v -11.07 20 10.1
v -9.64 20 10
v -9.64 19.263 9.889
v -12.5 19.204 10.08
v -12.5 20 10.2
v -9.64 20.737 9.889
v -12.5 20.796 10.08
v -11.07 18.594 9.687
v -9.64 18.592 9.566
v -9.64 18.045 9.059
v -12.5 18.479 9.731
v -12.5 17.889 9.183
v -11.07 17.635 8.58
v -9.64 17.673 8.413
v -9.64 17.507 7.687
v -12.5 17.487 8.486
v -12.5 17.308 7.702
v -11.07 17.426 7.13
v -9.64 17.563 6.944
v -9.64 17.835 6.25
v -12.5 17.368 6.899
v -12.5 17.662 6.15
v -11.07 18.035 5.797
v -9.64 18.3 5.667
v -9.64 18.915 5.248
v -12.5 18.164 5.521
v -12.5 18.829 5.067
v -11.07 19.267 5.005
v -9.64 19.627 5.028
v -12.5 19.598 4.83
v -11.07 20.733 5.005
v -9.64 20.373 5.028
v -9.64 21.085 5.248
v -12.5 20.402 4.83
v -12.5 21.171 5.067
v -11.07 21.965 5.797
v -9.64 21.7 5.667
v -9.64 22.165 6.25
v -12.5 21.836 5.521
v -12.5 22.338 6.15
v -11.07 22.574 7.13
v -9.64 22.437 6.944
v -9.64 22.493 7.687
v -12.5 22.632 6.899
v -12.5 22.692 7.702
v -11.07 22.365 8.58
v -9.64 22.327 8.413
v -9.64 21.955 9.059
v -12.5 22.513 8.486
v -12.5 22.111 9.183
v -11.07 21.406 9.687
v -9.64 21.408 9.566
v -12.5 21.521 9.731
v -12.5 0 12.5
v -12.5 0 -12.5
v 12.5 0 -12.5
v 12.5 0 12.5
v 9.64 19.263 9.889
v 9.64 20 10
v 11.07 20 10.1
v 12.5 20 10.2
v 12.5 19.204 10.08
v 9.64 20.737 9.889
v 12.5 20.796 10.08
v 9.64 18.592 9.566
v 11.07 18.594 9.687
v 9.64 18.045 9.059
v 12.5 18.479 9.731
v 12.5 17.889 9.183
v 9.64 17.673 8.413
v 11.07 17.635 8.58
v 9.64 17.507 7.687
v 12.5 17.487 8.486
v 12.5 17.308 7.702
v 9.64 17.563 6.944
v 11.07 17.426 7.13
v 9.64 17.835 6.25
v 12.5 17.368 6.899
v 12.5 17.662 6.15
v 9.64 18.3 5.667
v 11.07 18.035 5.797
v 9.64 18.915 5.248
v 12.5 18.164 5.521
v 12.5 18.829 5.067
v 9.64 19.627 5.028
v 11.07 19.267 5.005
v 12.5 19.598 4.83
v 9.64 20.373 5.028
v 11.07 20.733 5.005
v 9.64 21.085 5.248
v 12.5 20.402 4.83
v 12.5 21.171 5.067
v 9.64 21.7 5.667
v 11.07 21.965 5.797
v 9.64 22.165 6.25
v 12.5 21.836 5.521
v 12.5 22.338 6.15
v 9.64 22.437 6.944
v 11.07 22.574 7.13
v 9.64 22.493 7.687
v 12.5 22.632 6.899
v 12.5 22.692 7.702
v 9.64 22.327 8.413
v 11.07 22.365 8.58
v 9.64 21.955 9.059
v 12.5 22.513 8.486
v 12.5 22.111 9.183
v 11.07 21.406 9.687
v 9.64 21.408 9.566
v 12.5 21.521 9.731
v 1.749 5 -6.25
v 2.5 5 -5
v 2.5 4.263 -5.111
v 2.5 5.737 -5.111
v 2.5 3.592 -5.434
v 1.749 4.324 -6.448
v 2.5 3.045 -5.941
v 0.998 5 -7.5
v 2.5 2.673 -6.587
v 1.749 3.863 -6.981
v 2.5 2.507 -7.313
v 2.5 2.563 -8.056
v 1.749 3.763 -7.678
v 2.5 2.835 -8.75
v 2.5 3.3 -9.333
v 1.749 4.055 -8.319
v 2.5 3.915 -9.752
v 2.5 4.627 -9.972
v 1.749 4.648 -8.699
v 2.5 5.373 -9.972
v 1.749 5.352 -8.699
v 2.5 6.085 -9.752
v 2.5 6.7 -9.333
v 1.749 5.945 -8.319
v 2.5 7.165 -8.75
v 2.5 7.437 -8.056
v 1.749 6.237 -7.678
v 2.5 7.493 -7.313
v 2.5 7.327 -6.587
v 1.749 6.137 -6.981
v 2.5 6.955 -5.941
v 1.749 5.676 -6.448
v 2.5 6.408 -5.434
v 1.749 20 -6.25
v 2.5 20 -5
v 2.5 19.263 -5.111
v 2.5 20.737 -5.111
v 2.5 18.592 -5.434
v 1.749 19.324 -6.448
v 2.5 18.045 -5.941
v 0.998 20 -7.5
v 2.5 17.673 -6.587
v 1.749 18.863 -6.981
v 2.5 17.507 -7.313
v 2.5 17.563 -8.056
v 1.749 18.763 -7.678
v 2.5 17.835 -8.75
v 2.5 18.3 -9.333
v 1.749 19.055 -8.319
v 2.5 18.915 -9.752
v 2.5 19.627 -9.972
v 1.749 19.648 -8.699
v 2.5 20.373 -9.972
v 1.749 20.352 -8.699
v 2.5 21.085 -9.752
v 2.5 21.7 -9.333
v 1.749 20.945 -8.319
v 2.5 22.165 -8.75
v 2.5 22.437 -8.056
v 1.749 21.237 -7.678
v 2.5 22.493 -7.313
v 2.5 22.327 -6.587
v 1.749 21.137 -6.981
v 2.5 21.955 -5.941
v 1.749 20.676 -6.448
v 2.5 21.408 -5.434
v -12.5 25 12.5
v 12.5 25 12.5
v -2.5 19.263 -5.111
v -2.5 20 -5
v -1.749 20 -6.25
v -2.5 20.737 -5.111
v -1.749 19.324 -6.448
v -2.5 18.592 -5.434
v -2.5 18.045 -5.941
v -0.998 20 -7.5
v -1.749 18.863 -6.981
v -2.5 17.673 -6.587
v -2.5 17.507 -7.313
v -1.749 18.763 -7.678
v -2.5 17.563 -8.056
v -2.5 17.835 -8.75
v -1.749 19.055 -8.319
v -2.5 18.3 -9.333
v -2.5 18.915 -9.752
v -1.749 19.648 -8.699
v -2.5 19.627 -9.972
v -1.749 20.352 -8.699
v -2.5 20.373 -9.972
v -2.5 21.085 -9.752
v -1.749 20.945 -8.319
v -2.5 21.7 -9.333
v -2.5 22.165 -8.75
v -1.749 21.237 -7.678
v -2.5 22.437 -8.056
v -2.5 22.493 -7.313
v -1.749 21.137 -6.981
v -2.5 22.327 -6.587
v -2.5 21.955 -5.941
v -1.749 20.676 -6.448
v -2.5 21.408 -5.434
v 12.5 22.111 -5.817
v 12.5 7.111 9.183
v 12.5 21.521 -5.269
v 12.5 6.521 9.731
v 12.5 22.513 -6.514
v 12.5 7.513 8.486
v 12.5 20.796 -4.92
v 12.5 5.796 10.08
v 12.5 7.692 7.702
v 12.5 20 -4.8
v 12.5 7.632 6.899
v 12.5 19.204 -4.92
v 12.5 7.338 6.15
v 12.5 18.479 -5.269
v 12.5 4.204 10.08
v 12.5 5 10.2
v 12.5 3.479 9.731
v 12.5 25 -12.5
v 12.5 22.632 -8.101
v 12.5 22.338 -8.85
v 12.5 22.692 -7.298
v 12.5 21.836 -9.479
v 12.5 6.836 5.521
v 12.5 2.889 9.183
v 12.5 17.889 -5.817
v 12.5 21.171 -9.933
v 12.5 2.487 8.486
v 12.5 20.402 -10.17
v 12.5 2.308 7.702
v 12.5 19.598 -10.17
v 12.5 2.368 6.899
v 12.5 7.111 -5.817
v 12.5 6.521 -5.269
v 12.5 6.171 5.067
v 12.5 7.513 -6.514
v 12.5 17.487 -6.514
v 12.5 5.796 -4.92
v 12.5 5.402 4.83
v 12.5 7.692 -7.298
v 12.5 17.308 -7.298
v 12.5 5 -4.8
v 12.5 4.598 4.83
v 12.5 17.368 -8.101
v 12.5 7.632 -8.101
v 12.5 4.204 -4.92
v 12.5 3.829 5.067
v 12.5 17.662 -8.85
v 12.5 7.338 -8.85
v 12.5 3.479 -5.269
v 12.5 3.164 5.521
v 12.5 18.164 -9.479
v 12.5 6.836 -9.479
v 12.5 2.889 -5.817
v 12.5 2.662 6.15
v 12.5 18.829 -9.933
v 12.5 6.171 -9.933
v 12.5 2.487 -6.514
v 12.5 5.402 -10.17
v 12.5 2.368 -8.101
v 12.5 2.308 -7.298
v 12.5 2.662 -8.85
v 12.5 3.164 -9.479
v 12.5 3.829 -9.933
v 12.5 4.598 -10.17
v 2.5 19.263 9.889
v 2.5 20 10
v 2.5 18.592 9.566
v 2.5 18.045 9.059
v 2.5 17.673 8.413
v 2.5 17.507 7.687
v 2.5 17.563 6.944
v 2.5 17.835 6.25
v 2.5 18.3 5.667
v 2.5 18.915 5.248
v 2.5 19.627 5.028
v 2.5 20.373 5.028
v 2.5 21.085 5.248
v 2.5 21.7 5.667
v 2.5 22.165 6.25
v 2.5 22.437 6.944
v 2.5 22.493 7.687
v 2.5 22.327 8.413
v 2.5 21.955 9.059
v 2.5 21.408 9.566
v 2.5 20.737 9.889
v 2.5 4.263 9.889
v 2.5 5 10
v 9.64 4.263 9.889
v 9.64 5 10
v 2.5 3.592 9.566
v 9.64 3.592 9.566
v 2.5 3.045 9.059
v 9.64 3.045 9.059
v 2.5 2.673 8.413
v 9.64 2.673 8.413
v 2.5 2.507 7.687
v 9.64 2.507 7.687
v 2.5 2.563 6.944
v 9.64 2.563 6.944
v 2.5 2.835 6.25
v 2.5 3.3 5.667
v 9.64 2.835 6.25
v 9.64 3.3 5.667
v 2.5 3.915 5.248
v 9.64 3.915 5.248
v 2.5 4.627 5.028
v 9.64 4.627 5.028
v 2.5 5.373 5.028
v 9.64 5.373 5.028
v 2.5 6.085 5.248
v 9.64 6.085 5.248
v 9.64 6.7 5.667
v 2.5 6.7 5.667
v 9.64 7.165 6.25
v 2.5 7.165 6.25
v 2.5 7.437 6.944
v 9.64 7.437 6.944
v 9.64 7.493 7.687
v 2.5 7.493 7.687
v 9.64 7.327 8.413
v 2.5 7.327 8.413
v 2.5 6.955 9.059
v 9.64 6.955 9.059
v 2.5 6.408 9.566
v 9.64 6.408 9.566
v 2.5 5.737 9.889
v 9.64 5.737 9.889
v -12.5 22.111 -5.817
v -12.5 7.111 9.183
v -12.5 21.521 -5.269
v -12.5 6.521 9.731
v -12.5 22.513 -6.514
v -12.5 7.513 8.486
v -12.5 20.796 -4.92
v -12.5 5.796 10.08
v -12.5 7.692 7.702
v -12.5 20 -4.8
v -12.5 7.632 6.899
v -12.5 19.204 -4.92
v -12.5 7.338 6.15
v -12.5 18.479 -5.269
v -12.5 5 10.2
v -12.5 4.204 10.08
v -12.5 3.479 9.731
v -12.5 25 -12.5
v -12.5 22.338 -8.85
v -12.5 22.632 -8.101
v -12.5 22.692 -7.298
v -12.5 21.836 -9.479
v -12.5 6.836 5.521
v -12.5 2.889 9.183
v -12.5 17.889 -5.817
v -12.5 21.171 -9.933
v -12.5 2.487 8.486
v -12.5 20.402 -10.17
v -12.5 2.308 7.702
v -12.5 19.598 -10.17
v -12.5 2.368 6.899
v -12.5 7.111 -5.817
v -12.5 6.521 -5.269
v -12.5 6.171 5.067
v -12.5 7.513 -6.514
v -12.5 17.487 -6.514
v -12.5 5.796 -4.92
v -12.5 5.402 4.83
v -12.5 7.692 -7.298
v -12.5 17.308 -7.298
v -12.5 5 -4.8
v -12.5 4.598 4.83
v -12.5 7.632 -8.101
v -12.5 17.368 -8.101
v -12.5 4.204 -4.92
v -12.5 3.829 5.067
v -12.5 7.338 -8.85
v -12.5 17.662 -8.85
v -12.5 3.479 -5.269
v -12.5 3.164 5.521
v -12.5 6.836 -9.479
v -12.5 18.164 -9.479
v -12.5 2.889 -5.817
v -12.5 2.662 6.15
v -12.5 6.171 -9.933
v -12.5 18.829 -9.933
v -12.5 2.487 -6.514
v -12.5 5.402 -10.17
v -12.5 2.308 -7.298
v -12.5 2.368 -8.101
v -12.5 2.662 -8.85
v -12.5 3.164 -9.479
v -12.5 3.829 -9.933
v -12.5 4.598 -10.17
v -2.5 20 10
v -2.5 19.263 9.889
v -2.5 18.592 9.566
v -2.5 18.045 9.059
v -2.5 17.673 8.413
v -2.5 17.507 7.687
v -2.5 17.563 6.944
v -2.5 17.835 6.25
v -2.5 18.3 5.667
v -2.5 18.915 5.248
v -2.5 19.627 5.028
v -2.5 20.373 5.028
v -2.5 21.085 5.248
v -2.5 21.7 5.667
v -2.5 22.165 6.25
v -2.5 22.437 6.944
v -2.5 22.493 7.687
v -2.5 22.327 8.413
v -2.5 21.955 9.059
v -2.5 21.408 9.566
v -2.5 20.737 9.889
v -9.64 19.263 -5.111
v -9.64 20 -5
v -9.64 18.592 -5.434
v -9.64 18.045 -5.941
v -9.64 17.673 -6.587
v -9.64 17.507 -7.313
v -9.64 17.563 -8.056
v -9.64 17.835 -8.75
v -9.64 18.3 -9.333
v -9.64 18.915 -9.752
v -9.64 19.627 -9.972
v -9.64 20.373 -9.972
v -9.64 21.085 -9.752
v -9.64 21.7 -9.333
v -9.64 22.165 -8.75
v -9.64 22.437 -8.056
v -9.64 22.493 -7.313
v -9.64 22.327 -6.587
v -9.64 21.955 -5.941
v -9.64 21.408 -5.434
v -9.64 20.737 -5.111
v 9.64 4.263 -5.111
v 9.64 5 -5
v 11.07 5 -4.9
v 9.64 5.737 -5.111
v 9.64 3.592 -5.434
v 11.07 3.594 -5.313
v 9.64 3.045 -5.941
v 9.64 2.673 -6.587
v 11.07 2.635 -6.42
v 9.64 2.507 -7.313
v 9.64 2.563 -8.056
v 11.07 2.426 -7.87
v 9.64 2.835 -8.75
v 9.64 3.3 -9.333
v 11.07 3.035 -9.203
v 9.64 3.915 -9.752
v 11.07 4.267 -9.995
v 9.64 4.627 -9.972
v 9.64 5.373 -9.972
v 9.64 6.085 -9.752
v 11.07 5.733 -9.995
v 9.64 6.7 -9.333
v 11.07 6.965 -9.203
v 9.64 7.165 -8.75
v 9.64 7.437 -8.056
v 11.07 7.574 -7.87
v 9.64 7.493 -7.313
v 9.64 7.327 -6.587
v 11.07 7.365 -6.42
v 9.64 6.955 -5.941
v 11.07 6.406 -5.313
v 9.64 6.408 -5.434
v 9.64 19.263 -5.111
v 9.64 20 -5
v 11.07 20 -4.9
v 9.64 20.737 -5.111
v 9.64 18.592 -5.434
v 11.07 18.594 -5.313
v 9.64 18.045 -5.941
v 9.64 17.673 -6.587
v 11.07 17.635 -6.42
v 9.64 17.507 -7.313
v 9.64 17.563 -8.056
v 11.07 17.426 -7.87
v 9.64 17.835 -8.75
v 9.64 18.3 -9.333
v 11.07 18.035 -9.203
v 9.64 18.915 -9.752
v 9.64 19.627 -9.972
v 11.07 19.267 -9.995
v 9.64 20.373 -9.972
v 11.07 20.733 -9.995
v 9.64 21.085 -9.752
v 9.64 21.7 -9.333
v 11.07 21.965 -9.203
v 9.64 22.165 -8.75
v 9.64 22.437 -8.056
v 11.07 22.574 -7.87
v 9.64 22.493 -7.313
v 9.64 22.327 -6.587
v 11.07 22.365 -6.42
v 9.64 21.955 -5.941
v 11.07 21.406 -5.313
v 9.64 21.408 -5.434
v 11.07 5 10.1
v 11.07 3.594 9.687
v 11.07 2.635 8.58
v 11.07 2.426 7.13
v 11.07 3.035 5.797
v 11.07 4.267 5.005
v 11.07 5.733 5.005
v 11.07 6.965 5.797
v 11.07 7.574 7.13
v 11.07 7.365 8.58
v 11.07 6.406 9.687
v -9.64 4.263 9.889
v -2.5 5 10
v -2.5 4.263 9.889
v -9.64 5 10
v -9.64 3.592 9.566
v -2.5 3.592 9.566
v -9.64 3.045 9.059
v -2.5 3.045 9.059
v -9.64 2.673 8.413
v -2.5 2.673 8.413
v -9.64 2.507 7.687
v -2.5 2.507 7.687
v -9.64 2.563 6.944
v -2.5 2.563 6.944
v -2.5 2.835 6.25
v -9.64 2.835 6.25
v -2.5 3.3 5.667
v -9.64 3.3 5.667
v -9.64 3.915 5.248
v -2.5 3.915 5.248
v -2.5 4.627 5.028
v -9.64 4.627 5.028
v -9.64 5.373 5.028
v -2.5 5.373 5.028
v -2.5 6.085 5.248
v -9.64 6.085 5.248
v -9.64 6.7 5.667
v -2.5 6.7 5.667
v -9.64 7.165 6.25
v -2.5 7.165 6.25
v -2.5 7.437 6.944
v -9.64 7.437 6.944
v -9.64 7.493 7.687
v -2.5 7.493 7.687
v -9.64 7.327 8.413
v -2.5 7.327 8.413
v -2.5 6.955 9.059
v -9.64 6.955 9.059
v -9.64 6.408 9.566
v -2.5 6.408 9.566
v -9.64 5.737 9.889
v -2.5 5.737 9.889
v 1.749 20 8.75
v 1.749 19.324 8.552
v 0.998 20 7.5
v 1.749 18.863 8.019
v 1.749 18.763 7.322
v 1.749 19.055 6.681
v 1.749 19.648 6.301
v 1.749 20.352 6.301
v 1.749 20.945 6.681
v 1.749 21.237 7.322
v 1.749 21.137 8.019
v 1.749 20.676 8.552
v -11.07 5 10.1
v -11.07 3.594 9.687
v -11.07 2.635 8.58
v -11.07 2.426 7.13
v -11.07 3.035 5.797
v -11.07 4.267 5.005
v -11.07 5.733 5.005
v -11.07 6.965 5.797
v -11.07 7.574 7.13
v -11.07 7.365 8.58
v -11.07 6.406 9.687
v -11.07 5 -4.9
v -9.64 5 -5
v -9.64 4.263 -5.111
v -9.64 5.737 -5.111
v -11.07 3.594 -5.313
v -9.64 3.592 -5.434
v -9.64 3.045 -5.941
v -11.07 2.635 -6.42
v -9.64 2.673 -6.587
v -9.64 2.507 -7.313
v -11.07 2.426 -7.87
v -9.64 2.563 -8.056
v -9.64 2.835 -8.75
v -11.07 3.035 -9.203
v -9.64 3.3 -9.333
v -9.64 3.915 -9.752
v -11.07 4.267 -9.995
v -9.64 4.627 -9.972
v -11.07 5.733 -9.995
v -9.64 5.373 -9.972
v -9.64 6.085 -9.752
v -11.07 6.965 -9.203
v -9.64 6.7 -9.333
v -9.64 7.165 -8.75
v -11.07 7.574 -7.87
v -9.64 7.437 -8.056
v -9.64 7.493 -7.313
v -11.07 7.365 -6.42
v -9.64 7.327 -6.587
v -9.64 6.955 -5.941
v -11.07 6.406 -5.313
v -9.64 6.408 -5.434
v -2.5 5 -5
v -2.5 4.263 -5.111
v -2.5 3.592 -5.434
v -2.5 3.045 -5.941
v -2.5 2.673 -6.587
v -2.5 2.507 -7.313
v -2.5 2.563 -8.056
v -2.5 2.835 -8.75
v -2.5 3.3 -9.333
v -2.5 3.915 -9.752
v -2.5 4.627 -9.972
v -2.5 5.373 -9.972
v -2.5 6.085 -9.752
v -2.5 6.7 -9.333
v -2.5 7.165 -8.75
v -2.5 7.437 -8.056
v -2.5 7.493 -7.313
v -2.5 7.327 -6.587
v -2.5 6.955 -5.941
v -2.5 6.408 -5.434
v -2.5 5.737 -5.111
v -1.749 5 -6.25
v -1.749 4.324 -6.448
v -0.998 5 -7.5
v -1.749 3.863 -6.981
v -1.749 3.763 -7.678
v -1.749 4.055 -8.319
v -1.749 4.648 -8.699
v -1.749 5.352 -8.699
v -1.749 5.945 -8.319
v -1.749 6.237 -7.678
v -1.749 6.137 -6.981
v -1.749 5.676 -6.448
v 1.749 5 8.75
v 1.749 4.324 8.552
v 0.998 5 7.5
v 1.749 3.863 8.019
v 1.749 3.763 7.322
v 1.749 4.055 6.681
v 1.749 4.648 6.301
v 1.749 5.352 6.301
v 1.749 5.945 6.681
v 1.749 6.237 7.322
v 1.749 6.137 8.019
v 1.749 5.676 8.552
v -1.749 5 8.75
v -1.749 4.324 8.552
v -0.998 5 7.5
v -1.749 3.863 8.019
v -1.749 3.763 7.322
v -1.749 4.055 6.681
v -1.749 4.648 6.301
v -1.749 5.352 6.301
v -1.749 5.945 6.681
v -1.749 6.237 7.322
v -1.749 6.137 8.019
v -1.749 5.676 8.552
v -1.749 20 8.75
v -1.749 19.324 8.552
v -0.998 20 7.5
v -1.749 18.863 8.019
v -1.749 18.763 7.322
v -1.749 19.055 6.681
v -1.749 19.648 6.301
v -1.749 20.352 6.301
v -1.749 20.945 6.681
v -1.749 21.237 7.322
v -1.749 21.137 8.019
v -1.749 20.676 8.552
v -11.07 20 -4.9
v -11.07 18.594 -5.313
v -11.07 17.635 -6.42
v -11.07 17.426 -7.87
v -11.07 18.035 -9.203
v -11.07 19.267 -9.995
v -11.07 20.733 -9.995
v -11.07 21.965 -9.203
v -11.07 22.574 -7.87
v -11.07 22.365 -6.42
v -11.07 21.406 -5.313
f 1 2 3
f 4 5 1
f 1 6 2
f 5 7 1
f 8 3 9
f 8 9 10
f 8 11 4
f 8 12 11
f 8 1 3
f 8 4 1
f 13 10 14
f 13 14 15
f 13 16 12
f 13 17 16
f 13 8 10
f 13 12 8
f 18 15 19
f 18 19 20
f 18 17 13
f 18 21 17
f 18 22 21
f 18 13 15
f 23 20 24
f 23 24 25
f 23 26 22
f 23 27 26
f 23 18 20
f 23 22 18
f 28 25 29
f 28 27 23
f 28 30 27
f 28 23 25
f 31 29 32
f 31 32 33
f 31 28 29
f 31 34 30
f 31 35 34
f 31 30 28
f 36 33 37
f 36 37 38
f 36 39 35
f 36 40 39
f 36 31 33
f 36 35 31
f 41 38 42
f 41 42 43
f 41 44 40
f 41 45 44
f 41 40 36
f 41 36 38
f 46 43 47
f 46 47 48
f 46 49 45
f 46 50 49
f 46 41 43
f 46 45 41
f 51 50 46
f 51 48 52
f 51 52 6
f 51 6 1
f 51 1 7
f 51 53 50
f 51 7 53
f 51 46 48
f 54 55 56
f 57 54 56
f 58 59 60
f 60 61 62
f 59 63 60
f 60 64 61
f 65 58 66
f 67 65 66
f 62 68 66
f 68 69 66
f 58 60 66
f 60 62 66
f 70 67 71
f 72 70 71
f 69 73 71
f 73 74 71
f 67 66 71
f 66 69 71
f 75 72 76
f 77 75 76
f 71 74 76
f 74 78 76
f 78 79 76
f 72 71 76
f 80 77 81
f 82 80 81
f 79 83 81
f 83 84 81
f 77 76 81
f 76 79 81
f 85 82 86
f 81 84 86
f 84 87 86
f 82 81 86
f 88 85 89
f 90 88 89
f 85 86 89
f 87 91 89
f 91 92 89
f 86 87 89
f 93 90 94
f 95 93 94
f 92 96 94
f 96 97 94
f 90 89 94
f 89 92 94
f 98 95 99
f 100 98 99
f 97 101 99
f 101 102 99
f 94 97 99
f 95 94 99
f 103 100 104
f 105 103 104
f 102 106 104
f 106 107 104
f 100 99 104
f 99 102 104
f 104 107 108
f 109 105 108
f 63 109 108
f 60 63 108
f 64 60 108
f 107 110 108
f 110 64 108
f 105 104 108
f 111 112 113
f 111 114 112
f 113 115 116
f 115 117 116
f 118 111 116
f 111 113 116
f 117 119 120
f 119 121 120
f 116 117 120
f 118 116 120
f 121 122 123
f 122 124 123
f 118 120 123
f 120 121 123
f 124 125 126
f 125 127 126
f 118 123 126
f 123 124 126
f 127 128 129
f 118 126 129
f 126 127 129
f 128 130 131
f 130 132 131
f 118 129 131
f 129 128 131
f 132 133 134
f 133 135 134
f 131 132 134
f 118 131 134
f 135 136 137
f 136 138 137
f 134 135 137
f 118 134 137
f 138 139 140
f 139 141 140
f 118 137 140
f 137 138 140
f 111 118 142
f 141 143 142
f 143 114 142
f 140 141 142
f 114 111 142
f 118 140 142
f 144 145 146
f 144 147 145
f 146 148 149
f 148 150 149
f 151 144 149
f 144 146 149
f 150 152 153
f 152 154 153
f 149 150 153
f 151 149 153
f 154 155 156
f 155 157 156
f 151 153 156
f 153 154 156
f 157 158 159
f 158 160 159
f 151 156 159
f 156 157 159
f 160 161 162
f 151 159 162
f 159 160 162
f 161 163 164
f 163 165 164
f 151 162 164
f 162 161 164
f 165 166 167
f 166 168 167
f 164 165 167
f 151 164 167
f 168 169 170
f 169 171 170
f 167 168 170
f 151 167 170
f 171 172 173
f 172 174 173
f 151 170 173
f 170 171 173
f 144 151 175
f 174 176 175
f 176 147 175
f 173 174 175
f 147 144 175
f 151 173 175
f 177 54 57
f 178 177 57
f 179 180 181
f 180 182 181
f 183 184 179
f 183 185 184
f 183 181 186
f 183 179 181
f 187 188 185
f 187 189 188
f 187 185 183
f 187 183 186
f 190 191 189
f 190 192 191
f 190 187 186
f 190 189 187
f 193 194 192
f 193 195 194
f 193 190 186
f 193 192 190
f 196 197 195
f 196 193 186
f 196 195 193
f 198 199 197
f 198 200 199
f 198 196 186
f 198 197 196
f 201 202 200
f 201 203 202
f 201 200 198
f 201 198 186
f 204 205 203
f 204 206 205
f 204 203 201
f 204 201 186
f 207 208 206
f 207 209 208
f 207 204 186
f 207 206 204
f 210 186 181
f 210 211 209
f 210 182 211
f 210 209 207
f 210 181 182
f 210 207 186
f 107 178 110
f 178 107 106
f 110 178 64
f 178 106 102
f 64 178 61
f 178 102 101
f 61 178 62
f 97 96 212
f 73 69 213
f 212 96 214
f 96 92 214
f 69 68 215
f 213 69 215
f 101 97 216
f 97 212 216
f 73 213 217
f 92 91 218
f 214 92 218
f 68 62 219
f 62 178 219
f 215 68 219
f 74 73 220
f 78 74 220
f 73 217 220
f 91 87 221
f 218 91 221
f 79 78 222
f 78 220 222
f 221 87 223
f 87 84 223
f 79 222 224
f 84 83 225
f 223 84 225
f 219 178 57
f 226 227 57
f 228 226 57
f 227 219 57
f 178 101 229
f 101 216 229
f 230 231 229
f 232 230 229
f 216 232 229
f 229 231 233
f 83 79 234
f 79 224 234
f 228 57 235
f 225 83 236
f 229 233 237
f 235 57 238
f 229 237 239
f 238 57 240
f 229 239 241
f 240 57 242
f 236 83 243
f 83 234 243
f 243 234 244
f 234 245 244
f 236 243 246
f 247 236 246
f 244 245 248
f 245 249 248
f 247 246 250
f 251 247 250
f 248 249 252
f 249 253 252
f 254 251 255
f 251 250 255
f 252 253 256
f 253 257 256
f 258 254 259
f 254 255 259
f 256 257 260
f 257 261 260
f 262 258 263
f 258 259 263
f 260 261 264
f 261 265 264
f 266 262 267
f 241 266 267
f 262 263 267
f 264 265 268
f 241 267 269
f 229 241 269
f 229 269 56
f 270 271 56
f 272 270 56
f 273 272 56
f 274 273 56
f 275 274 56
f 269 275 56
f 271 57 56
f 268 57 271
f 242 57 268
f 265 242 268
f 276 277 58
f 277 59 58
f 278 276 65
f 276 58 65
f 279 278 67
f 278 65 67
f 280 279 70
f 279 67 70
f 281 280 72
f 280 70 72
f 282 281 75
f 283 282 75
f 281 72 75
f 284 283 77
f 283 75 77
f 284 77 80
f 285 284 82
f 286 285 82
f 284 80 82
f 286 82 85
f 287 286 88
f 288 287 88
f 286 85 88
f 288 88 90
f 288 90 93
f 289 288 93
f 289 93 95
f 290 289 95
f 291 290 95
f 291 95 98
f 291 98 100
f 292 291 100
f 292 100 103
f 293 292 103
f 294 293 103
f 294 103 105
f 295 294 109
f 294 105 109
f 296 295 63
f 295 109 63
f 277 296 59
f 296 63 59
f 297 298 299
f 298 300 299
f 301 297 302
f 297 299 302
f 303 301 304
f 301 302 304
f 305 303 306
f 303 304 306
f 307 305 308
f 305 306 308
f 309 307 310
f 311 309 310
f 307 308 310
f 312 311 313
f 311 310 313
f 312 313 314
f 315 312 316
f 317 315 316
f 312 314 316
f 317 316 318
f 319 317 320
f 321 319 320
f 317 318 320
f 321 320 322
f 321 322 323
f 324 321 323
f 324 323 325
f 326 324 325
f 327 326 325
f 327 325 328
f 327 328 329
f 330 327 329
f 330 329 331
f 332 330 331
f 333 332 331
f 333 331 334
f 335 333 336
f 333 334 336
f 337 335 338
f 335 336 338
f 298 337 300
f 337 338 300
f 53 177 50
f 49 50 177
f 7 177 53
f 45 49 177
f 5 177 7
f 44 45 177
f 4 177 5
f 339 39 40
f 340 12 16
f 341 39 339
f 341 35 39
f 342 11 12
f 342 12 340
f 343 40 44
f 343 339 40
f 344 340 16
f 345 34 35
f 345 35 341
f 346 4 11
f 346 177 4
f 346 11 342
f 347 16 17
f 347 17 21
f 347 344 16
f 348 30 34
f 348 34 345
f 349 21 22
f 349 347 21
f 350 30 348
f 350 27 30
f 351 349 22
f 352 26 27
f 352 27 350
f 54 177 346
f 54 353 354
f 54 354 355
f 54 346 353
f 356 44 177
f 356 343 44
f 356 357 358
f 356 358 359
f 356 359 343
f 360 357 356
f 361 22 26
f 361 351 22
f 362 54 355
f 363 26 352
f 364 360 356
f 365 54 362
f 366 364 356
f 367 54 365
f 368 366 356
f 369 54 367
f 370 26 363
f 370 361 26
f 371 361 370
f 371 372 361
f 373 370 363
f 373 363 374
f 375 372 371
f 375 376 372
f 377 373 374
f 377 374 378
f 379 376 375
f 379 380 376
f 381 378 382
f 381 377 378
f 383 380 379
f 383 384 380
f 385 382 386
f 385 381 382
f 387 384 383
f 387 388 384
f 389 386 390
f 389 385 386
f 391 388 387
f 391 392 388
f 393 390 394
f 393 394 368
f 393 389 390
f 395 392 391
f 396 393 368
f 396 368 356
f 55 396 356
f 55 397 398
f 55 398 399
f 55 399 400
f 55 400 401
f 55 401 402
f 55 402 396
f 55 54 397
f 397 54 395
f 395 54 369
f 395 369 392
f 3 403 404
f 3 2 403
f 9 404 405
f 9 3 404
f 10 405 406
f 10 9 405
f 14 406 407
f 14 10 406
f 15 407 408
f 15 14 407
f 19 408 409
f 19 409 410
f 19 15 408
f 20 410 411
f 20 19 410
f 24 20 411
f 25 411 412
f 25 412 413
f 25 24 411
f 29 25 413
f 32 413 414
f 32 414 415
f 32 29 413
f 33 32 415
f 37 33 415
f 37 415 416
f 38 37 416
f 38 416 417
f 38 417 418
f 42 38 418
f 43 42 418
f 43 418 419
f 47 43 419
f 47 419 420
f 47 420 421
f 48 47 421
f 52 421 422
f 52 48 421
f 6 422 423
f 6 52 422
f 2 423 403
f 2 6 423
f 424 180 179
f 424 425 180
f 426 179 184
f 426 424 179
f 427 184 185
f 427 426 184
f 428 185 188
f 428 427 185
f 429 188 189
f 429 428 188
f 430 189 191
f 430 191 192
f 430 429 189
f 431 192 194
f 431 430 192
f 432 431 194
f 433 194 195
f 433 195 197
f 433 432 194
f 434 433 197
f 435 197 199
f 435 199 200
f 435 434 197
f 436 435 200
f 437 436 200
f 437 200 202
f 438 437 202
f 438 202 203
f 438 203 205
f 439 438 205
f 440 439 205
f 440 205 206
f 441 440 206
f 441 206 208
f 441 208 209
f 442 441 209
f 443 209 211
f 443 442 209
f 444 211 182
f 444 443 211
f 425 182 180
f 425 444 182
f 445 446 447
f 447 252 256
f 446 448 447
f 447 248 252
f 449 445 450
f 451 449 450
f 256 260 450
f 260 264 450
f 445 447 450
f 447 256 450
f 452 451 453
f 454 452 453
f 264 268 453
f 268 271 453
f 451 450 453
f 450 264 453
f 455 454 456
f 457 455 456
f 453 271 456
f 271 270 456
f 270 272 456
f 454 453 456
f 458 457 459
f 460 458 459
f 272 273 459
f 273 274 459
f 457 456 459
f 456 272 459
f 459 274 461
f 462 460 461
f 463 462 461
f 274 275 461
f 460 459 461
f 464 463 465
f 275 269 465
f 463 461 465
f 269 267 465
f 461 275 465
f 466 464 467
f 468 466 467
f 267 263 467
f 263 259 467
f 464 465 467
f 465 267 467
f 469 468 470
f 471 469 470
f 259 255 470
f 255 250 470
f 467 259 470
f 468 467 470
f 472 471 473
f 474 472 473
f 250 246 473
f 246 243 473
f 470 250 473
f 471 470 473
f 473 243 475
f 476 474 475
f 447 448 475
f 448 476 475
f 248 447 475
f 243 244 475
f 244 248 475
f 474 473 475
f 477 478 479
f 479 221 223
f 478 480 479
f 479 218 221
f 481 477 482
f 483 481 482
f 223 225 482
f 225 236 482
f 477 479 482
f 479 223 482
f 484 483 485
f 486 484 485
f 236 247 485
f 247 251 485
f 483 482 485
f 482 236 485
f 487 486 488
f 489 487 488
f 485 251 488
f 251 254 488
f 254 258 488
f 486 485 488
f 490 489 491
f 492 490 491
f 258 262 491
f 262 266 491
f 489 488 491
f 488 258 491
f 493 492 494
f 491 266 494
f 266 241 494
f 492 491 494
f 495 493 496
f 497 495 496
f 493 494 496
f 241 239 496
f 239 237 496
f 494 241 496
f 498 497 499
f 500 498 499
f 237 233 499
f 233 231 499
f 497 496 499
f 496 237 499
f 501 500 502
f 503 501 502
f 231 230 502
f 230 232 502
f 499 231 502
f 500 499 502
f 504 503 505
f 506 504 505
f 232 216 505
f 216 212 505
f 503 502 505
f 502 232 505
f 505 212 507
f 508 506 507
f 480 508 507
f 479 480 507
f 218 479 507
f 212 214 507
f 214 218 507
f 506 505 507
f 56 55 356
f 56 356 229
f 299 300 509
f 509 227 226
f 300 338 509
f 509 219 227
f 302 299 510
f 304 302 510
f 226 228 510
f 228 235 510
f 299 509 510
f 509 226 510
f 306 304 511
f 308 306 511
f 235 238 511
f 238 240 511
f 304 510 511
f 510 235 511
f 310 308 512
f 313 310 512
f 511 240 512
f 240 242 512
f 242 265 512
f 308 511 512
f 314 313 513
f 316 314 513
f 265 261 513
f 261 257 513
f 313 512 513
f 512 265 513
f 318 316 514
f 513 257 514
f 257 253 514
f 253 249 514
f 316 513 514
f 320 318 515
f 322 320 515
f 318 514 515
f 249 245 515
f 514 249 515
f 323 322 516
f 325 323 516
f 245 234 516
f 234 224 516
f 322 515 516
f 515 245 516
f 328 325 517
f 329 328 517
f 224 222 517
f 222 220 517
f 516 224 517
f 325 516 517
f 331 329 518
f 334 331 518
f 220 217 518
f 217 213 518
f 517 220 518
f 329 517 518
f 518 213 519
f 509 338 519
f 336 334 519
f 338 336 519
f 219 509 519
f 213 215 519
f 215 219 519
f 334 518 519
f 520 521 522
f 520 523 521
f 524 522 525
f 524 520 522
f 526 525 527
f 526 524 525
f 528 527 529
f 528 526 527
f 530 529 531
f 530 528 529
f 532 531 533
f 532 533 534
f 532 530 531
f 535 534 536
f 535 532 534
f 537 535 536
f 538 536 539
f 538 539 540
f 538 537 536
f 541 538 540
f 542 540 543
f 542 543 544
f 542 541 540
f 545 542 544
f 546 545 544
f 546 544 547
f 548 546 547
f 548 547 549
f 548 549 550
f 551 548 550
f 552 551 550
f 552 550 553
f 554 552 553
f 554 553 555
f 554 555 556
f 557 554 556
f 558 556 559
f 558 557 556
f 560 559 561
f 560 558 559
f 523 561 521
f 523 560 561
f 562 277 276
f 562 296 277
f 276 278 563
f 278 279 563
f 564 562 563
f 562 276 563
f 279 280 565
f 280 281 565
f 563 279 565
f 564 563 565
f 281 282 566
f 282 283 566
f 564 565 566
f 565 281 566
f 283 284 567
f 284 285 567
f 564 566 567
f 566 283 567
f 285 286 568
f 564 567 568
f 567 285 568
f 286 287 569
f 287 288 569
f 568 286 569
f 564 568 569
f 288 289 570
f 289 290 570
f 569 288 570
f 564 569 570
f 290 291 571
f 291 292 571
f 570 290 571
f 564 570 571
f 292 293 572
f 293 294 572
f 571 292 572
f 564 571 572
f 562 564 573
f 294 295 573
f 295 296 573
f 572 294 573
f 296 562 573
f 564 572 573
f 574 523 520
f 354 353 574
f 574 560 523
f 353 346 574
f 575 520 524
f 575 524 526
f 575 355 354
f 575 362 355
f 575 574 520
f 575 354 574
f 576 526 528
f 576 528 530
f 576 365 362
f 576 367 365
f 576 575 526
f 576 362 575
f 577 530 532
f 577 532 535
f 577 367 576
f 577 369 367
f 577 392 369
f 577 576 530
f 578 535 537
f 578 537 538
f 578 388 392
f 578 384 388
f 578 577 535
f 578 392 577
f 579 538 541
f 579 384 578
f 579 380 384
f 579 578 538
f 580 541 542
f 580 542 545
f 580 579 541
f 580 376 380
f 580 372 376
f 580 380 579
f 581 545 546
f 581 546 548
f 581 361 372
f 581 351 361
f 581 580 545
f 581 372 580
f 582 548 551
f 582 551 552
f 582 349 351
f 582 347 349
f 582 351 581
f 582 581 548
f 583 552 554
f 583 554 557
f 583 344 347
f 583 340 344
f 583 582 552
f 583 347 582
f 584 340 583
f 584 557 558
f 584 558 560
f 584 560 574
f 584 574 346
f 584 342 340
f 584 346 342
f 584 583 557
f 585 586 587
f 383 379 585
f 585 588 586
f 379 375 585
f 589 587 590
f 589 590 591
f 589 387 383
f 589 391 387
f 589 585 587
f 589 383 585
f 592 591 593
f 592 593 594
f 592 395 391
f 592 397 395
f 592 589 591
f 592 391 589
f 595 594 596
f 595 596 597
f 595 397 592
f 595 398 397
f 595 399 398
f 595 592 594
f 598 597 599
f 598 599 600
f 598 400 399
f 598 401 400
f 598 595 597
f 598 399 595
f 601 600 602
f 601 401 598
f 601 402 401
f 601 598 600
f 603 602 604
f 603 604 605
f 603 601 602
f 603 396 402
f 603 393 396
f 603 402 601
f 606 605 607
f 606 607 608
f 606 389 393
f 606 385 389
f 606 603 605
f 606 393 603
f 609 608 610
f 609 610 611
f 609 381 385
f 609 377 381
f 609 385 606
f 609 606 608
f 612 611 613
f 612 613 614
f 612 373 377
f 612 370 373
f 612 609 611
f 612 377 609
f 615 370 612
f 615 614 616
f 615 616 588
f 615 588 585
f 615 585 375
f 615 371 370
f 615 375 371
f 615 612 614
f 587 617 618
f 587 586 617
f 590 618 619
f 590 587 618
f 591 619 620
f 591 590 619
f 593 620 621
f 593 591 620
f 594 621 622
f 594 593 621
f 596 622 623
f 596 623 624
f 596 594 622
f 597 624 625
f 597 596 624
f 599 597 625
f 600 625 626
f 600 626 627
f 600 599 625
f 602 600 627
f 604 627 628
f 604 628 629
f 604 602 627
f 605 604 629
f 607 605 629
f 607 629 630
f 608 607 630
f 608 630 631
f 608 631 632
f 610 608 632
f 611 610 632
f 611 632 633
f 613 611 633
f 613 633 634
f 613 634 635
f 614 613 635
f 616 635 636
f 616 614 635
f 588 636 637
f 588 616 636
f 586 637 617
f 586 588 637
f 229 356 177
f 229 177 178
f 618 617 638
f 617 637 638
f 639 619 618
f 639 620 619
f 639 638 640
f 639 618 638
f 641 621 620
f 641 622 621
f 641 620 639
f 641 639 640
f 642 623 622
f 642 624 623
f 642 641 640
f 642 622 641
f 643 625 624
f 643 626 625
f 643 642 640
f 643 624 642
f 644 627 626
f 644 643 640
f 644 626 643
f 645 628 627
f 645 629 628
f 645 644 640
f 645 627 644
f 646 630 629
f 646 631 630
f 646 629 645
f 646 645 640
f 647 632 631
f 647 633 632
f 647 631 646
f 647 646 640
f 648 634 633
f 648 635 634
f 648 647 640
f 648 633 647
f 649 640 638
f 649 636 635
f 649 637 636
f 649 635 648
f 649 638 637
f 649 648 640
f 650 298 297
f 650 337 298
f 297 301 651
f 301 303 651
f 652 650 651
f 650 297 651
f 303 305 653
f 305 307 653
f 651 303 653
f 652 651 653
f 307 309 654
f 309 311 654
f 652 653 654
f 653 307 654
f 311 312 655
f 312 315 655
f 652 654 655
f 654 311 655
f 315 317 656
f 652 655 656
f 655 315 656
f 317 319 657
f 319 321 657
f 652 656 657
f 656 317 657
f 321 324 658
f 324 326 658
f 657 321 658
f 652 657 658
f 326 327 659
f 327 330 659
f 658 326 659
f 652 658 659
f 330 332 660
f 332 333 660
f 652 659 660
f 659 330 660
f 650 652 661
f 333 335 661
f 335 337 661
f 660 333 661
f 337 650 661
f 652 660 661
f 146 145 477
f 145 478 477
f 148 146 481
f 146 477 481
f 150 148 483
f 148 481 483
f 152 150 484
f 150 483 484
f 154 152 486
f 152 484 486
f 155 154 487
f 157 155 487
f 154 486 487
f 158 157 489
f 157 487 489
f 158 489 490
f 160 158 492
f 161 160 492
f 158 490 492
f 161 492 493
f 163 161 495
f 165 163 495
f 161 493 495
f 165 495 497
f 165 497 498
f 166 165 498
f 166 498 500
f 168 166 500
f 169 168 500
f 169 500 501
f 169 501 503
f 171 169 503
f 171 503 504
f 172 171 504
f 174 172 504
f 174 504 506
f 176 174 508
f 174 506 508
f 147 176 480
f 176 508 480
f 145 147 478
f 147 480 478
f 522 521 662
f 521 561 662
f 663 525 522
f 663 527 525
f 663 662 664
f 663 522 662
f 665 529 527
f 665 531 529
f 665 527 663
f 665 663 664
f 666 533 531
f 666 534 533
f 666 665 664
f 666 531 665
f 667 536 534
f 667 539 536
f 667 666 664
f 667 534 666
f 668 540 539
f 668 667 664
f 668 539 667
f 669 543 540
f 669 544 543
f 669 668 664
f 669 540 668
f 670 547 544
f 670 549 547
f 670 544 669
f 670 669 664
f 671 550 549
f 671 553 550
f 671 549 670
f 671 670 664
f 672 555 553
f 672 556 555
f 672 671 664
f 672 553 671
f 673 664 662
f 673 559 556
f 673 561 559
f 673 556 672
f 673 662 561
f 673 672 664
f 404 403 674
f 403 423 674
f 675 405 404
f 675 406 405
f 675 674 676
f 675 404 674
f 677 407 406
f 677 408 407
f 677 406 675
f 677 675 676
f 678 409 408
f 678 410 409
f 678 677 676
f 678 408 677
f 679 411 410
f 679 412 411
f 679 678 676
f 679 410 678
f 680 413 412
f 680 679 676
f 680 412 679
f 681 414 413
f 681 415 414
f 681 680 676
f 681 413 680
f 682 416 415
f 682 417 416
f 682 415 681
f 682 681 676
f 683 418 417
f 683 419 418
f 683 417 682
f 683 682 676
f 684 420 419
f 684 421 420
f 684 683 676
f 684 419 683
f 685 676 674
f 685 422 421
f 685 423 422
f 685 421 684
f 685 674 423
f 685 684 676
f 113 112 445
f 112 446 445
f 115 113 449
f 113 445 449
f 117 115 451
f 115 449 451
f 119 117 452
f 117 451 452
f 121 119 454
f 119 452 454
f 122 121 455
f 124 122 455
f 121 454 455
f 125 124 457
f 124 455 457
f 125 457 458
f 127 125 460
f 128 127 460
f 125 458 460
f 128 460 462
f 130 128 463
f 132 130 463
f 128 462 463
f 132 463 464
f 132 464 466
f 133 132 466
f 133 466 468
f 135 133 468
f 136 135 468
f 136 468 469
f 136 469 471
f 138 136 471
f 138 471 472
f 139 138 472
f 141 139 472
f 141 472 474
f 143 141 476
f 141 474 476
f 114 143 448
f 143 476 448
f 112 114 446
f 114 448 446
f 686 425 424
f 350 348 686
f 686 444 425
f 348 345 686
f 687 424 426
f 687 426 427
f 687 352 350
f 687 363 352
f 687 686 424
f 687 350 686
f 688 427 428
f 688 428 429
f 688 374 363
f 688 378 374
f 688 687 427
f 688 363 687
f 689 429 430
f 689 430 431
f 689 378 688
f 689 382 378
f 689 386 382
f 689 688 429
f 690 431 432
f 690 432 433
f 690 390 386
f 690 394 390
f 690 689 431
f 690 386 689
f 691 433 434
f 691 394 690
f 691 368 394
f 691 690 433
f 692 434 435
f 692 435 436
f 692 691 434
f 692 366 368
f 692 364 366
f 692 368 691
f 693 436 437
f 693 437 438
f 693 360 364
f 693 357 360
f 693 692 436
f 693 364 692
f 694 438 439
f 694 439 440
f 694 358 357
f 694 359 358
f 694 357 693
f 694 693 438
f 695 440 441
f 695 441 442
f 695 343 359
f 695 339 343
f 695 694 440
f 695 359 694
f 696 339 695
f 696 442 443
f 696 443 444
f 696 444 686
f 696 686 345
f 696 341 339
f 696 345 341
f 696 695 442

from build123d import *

# Parameters (mm, degrees)
SKETCH2_W            = 25
SKETCH2_H            = 25
BOSS_EXTRUDE1_DEPTH  = 25
LPATTERN1_COUNT      = 2
LPATTERN1_PITCH      = 15
LPATTERN1_COUNT_DIR2 = 2
LPATTERN1_PITCH_DIR2 = 15


with BuildPart() as part:
    # Sketch2 → Boss-Extrude1 (new body)
    with BuildSketch(Plane(origin=(0, 0, 0), x_dir=(1, 0, 0), z_dir=(0, 1, 0))):
        Rectangle(SKETCH2_W, SKETCH2_H)
    extrude(amount=BOSS_EXTRUDE1_DEPTH)

    # Sketch4 → CSK for M3 Oval Head Machine Screw1 (revolve, cut)
    with BuildSketch(Plane(origin=(-12.5, 20, -7.5), x_dir=(0, 0, 1), z_dir=(0, 1, 0))):
        Polygon((0, 0), (0, 11.502151548), (2.5, 10), (2.5, 2.860133251), (2.7, 0), align=None)
    csk_for_m3_oval_head_machine_screw1 = revolve(axis=Axis((-18.85, 20, -7.5), (1, 0, 0)), mode=Mode.SUBTRACT)

    # LPattern1: CSK for M3 Oval Head Machine Screw1 2 × 2
    with Locations(*[(0, -i * LPATTERN1_PITCH, j * LPATTERN1_PITCH_DIR2) for i in range(LPATTERN1_COUNT) for j in range(LPATTERN1_COUNT_DIR2) if (i, j) != (0, 0)]):
        add(csk_for_m3_oval_head_machine_screw1, mode=Mode.SUBTRACT)

    # Mirror1: CSK for M3 Oval Head Machine Screw1 across plane
    add(csk_for_m3_oval_head_machine_screw1.mirror(Plane(origin=(0, 0, 0), x_dir=(0, 0, 1), z_dir=(1, 0, 0))), mode=Mode.SUBTRACT)

    # Mirror1 copy 1 sketch → Mirror1 copy 1 (revolve, cut)
    with BuildSketch(Plane(origin=(12.5, 20, 7.5), x_dir=(0, 0, 1), z_dir=(0, 1, 0))):
        Polygon((0, 0), (0, -11.502151548), (2.5, -10), (2.5, -2.860133251), (2.7, 0), align=None)
    revolve(axis=Axis((18.85, 20, 7.5), (1, 0, 0)), mode=Mode.SUBTRACT)

    # Mirror1 copy 2 sketch → Mirror1 copy 2 (revolve, cut)
    with BuildSketch(Plane(origin=(12.5, 5, -7.5), x_dir=(0, 0, 1), z_dir=(0, 1, 0))):
        Polygon((0, 0), (0, -11.502151548), (2.5, -10), (2.5, -2.860133251), (2.7, 0), align=None)
    revolve(axis=Axis((18.85, 5, -7.5), (1, 0, 0)), mode=Mode.SUBTRACT)

    # Mirror1 copy 3 sketch → Mirror1 copy 3 (revolve, cut)
    with BuildSketch(Plane(origin=(12.5, 5, 7.5), x_dir=(0, 0, 1), z_dir=(0, 1, 0))):
        Polygon((0, 0), (0, -11.502151548), (2.5, -10), (2.5, -2.860133251), (2.7, 0), align=None)
    revolve(axis=Axis((18.85, 5, 7.5), (1, 0, 0)), mode=Mode.SUBTRACT)


solid = part.part
